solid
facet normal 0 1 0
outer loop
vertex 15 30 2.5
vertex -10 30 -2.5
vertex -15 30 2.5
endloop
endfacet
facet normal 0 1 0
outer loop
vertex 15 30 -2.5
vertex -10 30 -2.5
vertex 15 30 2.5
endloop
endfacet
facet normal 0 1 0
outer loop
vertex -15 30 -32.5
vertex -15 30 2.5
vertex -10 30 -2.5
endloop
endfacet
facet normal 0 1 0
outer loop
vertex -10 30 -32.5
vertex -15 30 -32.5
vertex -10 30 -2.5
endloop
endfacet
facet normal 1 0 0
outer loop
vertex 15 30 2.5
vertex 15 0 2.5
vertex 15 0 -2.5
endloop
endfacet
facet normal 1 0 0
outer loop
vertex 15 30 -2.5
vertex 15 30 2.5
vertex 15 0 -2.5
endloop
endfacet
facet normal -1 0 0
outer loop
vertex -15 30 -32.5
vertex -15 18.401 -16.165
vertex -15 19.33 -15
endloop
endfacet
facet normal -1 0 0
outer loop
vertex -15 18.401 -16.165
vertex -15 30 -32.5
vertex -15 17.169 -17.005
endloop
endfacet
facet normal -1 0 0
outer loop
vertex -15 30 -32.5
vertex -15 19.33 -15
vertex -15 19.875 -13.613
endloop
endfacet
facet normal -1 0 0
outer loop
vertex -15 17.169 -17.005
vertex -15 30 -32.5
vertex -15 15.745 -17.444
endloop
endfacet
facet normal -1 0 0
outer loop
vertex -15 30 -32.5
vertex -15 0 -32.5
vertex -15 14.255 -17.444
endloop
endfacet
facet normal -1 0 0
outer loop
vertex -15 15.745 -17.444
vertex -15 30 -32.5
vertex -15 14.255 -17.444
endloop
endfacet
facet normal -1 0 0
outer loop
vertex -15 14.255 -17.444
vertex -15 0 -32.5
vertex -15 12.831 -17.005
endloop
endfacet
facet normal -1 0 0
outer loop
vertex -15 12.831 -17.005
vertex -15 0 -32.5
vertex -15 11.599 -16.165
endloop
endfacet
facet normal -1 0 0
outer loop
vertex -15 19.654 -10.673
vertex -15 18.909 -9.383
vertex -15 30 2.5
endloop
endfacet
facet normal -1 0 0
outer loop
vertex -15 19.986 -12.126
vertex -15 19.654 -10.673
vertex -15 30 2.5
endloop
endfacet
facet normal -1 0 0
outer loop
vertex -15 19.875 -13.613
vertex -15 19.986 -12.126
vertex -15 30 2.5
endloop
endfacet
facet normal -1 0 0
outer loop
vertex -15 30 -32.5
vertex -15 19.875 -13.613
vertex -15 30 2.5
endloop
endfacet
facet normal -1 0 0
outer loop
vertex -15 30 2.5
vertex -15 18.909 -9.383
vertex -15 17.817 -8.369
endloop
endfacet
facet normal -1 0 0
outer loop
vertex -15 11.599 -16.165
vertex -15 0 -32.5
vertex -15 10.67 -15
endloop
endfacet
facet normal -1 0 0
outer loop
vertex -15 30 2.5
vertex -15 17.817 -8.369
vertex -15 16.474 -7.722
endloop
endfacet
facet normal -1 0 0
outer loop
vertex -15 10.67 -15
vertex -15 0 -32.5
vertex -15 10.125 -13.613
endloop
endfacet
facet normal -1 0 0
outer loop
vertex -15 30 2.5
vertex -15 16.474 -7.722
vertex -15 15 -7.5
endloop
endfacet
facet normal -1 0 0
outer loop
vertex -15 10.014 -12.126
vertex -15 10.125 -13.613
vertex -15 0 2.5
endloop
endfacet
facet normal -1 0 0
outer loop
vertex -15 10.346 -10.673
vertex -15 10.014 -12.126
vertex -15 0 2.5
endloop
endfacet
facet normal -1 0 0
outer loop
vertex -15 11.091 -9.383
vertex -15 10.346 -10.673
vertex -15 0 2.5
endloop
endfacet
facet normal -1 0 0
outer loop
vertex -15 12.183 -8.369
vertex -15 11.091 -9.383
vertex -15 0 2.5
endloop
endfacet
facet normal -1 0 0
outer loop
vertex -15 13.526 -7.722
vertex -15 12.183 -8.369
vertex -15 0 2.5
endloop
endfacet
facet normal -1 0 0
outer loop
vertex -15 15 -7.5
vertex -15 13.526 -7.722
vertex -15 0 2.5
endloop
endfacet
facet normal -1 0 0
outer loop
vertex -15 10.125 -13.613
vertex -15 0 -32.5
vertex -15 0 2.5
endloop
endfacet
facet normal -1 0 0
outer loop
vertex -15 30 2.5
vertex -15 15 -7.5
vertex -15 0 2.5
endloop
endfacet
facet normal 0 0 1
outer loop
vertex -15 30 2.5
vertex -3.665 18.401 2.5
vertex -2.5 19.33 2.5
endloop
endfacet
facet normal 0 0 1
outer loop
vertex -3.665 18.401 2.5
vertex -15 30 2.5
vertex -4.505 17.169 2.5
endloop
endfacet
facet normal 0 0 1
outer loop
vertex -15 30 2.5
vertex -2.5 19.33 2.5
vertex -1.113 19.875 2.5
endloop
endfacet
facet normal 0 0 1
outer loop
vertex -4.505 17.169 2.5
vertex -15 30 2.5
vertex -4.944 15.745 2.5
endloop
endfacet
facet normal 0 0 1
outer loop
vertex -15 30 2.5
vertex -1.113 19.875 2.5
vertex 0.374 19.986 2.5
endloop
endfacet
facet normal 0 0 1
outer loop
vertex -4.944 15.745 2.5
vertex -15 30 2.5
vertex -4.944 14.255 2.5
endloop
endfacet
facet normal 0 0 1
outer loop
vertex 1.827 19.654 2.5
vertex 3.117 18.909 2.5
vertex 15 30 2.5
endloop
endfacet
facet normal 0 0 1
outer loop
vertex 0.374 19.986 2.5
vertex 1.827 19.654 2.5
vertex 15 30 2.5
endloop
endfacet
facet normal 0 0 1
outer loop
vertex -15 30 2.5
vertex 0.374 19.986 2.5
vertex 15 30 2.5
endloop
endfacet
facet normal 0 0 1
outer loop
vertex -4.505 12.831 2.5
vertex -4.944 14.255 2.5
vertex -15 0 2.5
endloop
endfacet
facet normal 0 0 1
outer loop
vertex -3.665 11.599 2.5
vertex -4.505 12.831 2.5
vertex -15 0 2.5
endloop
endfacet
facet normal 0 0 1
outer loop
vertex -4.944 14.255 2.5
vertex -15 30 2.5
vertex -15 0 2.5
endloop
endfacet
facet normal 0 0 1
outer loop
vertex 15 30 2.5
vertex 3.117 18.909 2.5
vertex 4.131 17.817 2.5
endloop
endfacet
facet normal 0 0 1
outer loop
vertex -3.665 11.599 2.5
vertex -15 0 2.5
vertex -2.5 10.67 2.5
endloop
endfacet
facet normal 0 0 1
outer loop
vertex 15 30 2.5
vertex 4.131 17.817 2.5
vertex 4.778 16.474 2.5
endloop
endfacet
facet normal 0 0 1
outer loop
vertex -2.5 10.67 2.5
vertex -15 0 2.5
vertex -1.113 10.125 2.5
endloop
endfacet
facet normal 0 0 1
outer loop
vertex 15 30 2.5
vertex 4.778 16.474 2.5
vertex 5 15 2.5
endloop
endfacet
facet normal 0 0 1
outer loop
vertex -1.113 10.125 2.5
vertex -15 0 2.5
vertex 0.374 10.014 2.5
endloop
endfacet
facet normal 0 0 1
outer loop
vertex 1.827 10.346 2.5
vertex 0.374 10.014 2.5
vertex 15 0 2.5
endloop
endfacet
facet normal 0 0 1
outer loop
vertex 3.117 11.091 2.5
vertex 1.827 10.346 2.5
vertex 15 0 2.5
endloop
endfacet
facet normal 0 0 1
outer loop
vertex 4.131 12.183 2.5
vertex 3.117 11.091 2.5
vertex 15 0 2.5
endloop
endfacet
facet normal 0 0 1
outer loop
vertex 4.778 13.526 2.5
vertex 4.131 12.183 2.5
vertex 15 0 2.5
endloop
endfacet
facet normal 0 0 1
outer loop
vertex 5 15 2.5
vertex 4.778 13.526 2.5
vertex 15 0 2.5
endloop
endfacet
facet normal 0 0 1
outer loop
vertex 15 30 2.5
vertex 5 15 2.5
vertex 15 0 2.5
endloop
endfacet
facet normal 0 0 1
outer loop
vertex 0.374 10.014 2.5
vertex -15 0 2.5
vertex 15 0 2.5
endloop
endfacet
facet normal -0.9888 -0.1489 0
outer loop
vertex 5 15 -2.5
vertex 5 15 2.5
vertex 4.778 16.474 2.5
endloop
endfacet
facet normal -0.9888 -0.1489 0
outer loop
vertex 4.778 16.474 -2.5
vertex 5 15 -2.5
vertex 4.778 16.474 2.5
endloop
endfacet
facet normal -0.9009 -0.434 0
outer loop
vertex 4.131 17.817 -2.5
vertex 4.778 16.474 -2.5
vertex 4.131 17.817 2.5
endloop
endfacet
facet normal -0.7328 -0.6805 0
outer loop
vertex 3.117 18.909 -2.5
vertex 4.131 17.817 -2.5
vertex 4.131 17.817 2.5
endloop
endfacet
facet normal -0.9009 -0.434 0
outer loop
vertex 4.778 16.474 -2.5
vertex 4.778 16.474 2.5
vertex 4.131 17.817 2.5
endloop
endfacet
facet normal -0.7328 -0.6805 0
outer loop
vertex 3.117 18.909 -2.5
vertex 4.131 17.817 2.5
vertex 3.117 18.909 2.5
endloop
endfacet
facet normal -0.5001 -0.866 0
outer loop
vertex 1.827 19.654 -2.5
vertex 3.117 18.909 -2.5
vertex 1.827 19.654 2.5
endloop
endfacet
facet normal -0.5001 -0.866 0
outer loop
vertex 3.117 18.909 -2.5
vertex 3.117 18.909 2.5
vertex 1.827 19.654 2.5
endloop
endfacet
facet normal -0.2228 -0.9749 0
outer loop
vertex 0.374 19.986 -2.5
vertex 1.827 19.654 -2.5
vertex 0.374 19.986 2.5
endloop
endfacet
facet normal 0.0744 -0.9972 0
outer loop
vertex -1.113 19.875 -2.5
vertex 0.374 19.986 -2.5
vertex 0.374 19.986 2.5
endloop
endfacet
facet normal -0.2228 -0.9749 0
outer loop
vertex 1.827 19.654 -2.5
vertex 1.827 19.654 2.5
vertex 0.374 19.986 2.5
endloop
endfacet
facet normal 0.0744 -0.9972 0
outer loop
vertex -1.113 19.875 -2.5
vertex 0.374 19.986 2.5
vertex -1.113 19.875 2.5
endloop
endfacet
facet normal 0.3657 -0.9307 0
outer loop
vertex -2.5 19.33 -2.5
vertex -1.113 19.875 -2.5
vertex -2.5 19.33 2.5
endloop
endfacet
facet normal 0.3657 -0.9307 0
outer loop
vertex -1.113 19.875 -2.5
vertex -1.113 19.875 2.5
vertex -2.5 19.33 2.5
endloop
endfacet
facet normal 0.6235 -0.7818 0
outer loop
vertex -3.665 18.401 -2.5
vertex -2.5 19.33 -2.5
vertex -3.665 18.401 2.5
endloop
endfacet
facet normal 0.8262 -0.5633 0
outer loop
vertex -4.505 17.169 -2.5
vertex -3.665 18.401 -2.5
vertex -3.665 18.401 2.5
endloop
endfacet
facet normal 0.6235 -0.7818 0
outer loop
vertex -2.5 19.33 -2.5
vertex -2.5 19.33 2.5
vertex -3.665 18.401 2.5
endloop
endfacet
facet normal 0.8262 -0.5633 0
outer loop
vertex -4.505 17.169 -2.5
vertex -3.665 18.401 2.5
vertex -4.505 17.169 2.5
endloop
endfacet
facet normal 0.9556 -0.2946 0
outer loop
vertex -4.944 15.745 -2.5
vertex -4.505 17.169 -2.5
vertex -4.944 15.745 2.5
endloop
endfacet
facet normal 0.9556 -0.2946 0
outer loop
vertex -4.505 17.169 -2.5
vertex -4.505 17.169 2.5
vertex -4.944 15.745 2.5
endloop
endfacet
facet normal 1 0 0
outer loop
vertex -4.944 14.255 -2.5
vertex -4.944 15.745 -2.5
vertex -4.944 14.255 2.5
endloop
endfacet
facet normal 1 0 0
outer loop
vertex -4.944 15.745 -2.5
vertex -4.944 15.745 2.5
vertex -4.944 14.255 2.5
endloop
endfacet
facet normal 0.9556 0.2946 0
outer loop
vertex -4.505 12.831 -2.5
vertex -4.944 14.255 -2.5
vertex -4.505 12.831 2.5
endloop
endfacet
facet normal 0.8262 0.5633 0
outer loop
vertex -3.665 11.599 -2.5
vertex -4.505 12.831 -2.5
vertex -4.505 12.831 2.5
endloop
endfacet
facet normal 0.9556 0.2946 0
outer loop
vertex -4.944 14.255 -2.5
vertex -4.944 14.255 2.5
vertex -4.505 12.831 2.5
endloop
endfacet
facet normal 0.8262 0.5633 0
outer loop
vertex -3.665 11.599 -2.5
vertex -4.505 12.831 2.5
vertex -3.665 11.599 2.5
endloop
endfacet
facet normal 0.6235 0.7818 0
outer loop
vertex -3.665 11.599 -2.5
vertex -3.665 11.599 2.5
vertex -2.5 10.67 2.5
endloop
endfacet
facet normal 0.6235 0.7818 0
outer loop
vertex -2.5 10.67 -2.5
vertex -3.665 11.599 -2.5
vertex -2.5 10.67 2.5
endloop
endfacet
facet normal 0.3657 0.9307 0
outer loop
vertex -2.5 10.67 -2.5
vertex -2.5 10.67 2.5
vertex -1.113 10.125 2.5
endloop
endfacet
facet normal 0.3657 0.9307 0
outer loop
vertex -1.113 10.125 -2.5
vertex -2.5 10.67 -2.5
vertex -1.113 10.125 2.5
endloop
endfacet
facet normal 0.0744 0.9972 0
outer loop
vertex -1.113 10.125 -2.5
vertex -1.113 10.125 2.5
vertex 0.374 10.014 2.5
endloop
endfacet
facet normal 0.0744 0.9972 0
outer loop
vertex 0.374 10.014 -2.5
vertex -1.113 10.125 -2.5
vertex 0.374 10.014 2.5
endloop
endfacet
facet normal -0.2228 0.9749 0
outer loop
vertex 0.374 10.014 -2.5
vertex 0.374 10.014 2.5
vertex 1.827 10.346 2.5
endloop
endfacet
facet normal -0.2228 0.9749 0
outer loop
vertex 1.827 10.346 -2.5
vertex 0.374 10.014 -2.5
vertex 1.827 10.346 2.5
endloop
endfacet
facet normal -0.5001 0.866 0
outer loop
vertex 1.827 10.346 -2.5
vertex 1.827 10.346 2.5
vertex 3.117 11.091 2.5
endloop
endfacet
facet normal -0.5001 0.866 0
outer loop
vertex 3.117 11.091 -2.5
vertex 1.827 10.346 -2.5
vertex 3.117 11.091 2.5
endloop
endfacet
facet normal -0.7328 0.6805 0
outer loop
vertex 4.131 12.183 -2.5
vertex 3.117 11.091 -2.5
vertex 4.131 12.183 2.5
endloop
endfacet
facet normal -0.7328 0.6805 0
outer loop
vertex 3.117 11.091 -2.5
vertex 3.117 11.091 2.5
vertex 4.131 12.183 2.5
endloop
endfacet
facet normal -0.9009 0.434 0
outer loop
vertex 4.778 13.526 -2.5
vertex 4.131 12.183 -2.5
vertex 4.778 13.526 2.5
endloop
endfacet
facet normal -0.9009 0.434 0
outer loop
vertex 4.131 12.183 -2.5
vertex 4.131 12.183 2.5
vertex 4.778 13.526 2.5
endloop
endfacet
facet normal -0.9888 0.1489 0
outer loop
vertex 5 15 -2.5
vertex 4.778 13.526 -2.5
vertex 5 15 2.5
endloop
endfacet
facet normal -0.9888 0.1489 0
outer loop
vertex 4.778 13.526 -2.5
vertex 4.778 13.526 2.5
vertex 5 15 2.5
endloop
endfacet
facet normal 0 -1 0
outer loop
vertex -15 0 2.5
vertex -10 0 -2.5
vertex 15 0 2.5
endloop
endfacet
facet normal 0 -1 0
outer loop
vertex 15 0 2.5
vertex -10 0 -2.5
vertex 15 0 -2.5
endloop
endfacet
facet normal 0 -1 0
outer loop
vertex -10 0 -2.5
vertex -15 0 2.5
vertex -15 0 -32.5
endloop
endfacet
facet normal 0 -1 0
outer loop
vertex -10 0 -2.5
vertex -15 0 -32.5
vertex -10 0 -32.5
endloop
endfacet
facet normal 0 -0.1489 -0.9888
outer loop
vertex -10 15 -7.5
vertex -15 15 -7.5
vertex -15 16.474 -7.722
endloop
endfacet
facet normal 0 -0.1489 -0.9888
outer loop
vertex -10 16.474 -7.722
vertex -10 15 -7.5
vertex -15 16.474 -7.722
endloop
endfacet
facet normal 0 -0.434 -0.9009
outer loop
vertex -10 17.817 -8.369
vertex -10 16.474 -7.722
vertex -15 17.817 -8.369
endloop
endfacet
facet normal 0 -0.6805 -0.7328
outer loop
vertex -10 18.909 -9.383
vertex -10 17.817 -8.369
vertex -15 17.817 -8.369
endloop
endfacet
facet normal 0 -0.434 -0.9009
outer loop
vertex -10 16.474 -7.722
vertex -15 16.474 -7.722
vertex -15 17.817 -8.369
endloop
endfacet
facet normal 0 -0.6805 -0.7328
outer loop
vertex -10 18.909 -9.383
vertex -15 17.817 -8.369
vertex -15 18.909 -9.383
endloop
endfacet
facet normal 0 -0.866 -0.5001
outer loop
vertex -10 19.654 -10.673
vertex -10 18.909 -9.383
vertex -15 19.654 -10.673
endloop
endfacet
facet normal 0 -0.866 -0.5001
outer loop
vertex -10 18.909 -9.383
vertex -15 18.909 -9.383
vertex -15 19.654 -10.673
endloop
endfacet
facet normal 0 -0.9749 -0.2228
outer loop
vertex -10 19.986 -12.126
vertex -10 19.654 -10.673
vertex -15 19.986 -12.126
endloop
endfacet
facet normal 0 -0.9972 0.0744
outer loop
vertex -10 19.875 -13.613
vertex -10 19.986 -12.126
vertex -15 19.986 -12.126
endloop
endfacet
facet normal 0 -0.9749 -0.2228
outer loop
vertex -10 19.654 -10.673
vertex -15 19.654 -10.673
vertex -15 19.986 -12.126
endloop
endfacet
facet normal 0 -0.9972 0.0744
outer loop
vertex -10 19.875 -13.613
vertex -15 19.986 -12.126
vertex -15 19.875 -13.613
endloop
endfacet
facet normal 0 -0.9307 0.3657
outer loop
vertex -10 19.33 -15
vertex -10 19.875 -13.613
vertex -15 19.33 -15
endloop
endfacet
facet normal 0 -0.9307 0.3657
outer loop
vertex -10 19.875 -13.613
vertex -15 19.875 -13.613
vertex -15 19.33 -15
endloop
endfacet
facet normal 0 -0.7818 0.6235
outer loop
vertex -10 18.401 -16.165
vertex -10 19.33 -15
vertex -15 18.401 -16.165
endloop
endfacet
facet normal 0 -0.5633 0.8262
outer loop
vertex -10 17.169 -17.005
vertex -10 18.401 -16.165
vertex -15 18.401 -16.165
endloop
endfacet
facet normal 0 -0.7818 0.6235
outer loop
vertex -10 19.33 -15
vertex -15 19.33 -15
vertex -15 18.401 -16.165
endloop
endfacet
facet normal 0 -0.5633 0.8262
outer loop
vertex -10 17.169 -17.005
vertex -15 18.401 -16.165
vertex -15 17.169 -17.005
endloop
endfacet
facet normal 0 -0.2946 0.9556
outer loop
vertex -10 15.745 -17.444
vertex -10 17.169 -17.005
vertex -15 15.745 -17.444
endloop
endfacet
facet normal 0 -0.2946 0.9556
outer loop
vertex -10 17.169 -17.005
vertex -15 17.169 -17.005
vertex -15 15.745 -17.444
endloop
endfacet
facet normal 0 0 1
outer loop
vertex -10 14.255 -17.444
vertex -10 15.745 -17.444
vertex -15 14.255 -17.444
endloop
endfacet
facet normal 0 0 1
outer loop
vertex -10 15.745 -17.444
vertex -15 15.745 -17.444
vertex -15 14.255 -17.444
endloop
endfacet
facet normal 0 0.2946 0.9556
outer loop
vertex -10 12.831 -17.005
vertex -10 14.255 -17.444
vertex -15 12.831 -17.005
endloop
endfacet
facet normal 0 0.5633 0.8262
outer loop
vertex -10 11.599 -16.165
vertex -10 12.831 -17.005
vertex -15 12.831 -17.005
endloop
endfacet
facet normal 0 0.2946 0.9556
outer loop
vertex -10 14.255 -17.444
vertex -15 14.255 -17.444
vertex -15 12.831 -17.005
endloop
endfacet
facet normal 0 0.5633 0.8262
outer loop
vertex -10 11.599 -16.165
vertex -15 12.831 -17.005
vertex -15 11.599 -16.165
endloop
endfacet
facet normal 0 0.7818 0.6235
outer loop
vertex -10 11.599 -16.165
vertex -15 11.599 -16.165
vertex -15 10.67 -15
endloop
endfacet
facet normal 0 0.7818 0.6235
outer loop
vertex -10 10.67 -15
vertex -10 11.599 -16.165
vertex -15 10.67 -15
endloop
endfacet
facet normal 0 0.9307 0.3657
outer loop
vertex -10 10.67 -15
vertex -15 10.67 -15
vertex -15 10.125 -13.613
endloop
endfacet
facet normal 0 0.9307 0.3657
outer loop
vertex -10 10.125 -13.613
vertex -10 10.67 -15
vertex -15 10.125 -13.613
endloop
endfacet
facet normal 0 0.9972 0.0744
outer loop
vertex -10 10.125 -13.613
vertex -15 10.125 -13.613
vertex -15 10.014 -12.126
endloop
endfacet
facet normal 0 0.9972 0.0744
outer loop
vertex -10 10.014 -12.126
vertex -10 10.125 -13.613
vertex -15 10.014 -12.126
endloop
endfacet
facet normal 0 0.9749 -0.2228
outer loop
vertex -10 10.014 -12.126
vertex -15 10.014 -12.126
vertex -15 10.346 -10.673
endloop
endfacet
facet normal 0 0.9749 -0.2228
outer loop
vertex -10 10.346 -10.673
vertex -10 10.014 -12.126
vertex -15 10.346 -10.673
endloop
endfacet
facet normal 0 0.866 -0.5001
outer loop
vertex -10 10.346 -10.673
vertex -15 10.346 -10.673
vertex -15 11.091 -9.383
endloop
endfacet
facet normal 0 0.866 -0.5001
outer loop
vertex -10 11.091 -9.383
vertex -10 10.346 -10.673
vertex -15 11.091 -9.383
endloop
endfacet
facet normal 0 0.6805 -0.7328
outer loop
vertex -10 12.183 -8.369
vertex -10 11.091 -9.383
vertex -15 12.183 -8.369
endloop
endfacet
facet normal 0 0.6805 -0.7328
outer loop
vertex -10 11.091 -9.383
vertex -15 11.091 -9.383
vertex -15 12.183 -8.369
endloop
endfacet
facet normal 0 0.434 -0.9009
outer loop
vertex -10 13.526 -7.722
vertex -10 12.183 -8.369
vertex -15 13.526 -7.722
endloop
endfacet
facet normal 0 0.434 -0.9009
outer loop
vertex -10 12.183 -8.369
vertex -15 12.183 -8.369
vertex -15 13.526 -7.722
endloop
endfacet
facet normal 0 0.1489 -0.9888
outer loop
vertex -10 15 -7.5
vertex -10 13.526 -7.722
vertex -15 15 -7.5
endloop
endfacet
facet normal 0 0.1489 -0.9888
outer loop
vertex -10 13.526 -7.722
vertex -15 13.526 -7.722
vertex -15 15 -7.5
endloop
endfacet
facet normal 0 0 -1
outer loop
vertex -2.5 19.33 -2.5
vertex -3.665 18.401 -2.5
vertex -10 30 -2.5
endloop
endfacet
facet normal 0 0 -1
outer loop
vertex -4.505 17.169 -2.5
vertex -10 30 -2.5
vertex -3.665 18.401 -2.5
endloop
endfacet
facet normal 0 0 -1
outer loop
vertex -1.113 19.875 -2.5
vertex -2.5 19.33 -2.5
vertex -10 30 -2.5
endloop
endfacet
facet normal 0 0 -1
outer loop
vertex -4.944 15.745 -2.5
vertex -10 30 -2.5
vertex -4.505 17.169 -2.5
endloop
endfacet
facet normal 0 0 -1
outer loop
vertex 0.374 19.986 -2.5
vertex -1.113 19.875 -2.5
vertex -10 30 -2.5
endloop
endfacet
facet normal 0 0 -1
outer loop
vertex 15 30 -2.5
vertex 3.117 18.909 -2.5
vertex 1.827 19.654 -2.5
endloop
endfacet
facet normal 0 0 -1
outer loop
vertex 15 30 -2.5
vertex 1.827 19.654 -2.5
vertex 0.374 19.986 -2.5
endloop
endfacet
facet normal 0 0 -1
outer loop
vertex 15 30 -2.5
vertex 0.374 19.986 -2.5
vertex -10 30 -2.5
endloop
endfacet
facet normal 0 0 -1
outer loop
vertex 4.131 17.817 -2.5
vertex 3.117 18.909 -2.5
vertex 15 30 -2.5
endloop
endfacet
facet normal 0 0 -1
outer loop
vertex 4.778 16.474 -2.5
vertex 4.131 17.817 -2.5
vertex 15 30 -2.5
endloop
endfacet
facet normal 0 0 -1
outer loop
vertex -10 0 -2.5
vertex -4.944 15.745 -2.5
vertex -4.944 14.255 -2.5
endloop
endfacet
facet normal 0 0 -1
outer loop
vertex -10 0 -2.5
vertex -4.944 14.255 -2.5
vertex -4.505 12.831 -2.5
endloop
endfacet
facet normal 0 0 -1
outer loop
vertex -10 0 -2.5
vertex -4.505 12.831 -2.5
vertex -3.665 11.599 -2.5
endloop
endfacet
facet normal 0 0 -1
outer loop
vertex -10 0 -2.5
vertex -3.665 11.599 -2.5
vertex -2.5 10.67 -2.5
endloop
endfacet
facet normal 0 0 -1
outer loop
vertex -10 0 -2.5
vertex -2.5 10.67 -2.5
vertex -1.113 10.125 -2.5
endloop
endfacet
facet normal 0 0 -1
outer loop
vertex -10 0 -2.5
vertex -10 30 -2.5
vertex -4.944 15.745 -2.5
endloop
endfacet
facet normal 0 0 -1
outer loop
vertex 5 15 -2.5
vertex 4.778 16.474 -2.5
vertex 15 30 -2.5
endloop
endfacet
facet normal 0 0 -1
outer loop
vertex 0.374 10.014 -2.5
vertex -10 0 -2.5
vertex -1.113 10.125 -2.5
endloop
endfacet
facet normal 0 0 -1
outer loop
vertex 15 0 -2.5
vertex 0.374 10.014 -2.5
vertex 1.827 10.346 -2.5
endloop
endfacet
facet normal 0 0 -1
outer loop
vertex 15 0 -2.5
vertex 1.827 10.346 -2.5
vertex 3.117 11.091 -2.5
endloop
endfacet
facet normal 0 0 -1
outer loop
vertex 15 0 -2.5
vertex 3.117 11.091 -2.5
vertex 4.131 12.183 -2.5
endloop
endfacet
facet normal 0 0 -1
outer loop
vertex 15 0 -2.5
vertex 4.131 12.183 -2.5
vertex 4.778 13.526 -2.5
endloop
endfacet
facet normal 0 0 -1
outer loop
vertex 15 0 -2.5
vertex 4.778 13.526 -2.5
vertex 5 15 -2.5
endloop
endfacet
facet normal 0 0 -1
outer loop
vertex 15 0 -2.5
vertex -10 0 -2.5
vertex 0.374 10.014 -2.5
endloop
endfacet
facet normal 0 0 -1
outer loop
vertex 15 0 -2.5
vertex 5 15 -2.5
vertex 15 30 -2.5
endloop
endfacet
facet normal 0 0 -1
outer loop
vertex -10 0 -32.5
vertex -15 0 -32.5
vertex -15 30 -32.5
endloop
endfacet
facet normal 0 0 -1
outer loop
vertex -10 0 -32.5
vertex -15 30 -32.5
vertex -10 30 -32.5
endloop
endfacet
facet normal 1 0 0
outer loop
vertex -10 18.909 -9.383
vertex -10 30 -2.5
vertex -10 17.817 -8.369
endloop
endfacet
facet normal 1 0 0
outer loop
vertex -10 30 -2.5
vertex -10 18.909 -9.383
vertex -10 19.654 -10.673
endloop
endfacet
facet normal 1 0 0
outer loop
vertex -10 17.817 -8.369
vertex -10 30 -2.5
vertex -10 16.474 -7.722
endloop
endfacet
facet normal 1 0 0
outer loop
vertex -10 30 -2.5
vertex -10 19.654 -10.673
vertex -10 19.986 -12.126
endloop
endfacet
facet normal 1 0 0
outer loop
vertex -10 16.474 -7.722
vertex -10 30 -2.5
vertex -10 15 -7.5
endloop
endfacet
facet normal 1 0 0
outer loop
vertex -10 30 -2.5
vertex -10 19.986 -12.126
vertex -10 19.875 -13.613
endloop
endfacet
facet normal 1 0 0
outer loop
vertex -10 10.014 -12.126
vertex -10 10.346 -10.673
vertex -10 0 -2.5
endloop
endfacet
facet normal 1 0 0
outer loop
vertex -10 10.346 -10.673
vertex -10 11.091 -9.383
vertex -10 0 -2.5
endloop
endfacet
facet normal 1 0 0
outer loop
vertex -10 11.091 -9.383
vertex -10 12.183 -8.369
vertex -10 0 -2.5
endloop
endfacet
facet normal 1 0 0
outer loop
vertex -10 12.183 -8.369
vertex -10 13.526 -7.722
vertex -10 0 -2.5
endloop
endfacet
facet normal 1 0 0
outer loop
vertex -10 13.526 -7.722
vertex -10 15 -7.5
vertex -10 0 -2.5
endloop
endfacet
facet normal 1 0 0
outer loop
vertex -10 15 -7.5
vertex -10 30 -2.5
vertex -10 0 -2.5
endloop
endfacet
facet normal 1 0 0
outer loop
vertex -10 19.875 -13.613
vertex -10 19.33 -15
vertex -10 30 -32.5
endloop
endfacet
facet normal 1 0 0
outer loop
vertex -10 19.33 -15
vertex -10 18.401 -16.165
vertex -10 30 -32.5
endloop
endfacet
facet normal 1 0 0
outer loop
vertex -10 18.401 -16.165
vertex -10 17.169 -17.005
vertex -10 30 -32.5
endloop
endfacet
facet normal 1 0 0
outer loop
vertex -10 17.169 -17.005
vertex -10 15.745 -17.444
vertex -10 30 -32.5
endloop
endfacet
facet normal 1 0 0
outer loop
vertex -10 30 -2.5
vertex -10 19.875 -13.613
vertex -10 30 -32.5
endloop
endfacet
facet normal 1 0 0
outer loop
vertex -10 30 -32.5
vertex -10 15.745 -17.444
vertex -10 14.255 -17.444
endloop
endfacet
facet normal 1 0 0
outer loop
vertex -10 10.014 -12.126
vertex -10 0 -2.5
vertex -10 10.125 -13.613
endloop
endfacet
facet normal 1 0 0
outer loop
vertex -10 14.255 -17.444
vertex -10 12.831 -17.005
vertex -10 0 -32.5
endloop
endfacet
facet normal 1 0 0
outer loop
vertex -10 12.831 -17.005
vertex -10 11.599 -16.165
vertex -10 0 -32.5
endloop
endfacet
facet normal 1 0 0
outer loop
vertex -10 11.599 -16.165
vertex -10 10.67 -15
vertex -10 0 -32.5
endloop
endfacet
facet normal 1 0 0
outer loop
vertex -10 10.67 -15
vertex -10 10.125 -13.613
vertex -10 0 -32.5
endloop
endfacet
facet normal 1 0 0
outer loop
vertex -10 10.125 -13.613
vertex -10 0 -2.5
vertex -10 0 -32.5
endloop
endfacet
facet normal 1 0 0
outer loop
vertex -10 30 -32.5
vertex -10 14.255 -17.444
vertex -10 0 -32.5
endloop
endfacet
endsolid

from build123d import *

# Parameters (mm, degrees)
CROQUIS1_W              = 5
CROQUIS1_H              = 30
CROQUIS1_W_2            = 30
CROQUIS1_H_2            = 5
SALIENTE_EXTRUIR1_DEPTH = 30
CROQUIS2_R              = 5
CORTAR_EXTRUIR1_DEPTH   = 5
CROQUIS3_R              = 5
CORTAR_EXTRUIR2_DEPTH   = 5


with BuildPart() as part:
    # Croquis1 → Saliente-Extruir1 (new body)
    with BuildSketch(Plane(origin=(0, 0, 0), x_dir=(1, 0, 0), z_dir=(0, 1, 0))):
        with Locations((-12.5, 17.5)):
            Rectangle(CROQUIS1_W, CROQUIS1_H)
        Rectangle(CROQUIS1_W_2, CROQUIS1_H_2)
    extrude(amount=SALIENTE_EXTRUIR1_DEPTH)

    # Croquis2 → Cortar-Extruir1 (cut)
    with BuildSketch(Plane.XY.offset(2.5)):
        with Locations((0, 15)):
            Circle(CROQUIS2_R)
    extrude(amount=-CORTAR_EXTRUIR1_DEPTH, mode=Mode.SUBTRACT)

    # Croquis3 → Cortar-Extruir2 (cut)
    with BuildSketch(Plane.ZY.offset(15)):
        with Locations((-12.5, 15)):
            Circle(CROQUIS3_R)
    extrude(amount=-CORTAR_EXTRUIR2_DEPTH, mode=Mode.SUBTRACT)


solid = part.part
